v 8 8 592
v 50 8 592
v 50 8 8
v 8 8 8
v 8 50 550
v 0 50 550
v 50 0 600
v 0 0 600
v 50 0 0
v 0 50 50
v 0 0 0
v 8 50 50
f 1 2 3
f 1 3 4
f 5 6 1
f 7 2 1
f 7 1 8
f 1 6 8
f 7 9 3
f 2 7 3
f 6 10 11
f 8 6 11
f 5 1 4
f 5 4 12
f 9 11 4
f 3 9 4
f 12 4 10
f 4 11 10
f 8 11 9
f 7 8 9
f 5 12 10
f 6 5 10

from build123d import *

# Parameters (mm, degrees)
F1_DEPTH = 600
F3_DEPTH = 50.001
F5_DEPTH = 50.001


with BuildPart() as f1:
    # F0 (on Top) → F1 (new body)
    with BuildSketch(Plane.XY):
        Polygon((0, 50), (0, 0), (50, 0), (50, 8), (8, 8), (8, 50), align=None)
    extrude(amount=F1_DEPTH)

    # F2 (on face) → F3 (cut, through all)
    with BuildSketch(Plane(origin=(0, 0, 0), x_dir=(0, -1, 0), z_dir=(-1, 0, 0))):
        Polygon((-50, 550), (0, 600), (-50, 600), align=None)
    extrude(amount=-F3_DEPTH, mode=Mode.SUBTRACT)

    # F4 (on face) → F5 (cut, through all)
    with BuildSketch(Plane(origin=(0, 0, 0), x_dir=(0, -1, 0), z_dir=(-1, 0, 0))):
        Polygon((-50, 0), (0, 0), (-50, 50), align=None)
    extrude(amount=-F5_DEPTH, mode=Mode.SUBTRACT)


solid = f1.part
